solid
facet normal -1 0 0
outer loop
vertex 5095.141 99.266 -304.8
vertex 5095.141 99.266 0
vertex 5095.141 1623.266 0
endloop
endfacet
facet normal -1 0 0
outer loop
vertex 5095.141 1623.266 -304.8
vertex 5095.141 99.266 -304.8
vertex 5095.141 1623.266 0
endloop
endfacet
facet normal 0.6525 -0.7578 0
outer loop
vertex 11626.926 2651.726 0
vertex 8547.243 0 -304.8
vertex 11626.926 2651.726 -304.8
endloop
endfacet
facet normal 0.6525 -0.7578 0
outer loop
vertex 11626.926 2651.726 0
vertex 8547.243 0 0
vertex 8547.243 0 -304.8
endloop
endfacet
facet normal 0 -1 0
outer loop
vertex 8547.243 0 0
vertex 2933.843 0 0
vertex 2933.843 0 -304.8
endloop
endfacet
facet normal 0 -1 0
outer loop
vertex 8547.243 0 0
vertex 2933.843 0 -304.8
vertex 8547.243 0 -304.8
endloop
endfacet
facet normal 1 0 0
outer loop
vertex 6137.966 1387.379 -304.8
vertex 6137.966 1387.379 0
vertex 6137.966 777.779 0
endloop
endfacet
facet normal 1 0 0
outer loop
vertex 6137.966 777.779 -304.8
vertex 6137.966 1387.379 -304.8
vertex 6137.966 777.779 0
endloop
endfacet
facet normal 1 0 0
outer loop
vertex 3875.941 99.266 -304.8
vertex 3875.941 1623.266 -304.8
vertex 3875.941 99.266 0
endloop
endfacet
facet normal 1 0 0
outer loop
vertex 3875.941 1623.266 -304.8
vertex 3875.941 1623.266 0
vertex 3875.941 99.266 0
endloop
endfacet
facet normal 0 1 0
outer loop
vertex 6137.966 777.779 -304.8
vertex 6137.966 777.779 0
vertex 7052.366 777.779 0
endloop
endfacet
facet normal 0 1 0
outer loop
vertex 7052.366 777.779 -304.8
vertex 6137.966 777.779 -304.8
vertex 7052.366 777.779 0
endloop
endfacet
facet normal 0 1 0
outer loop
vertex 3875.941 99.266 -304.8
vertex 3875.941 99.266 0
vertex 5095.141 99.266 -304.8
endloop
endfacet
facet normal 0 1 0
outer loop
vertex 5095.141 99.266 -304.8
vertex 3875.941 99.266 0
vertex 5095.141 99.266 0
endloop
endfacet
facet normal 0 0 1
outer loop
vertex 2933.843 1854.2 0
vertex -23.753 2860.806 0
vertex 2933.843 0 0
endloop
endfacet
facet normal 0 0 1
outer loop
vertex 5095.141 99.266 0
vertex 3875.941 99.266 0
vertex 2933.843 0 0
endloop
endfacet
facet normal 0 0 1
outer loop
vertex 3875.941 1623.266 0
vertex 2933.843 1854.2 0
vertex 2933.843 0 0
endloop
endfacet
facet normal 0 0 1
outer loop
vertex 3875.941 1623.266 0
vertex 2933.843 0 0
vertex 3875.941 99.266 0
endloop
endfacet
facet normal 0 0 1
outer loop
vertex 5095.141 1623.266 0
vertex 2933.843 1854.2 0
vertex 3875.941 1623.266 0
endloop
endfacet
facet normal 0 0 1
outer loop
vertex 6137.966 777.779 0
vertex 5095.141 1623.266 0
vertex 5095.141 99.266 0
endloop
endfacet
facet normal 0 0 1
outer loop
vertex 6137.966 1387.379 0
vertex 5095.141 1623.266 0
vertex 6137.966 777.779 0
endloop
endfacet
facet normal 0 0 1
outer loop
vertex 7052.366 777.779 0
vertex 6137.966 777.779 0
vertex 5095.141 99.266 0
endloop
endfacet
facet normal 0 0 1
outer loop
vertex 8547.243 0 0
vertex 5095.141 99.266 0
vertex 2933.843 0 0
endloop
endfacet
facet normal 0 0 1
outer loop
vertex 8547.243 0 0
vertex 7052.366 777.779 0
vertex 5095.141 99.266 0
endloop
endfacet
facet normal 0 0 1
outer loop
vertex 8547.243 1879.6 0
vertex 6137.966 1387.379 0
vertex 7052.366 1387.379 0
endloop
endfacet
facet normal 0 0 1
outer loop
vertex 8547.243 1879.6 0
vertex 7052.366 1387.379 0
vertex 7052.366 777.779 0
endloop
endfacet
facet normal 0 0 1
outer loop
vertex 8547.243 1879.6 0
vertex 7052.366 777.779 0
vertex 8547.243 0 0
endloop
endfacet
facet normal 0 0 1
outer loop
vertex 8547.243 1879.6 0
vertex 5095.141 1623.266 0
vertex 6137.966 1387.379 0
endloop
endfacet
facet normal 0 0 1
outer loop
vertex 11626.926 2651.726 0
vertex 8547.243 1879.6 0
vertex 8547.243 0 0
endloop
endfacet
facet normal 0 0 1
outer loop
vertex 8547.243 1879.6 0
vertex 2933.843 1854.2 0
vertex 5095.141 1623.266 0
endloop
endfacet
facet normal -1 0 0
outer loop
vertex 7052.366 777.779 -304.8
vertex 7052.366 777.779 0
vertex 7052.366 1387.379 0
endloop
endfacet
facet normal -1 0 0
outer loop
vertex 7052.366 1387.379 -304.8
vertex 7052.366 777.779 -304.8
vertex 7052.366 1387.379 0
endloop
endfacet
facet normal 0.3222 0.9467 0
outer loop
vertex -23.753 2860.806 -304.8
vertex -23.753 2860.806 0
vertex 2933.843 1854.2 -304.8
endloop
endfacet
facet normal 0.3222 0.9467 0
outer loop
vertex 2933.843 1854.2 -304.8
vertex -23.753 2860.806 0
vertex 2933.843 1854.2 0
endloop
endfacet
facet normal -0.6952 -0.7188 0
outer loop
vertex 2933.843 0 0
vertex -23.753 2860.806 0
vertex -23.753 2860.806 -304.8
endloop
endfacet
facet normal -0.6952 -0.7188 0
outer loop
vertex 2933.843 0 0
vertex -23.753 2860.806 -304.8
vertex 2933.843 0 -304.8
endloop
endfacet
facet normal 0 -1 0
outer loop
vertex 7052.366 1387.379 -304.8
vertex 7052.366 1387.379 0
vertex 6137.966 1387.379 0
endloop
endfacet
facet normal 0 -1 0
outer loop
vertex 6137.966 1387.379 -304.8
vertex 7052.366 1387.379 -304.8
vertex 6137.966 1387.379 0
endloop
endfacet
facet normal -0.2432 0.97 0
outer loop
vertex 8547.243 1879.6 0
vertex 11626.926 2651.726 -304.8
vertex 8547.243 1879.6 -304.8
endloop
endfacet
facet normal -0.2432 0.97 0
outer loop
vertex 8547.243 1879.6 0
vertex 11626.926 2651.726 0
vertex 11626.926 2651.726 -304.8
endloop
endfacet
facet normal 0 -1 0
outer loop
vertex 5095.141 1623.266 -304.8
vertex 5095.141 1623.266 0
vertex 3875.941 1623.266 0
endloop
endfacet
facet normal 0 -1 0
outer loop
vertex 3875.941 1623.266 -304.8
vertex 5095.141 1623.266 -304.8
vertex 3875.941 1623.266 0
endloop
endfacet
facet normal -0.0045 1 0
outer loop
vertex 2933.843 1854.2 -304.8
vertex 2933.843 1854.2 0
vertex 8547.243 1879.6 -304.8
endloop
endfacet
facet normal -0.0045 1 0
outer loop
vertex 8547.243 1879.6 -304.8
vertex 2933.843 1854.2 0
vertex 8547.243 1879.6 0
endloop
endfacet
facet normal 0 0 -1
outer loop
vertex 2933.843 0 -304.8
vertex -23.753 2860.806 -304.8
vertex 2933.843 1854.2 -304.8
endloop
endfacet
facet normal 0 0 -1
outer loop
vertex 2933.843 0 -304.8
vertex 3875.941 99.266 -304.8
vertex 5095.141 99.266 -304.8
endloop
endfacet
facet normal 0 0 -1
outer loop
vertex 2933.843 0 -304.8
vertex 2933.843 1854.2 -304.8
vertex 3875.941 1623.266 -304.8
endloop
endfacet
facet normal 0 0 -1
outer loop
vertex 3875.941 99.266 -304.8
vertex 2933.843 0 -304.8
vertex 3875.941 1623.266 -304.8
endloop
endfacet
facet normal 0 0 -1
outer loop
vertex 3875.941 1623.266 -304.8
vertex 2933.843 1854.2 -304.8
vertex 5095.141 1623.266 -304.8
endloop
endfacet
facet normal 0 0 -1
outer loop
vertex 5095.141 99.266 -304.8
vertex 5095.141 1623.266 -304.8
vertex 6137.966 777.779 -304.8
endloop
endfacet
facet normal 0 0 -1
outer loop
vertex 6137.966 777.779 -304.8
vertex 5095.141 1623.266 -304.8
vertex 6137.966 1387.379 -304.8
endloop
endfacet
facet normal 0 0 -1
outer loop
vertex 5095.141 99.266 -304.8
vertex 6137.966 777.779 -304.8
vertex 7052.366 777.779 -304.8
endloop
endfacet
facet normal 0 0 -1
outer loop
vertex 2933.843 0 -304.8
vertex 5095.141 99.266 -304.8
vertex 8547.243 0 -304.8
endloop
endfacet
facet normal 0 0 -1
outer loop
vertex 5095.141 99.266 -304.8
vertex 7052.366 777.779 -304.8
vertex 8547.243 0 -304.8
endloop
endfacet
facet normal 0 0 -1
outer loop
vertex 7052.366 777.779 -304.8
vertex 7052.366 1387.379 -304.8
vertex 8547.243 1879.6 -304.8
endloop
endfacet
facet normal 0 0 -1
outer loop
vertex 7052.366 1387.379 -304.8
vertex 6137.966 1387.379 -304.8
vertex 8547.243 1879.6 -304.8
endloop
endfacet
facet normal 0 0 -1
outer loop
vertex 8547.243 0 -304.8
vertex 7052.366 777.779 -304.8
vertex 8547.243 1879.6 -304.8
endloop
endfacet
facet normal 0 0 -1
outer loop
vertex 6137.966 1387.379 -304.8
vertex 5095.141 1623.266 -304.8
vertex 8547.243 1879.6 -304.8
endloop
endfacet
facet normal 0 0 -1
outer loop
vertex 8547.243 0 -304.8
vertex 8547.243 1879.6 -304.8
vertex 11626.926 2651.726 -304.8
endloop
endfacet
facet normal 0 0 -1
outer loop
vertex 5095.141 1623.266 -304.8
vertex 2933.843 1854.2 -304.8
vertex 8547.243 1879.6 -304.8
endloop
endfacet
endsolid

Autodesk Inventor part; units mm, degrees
ref_plane "YZ Plane" through (0, 0, 0) normal (1, 0, 0) x (0, 1, 0)
ref_plane "XZ Plane" through (0, 0, 0) normal (0, 1, 0) x (-1, 0, 0)
ref_plane "XY Plane" through (0, 0, 0) normal (0, 0, 1) x (1, 0, 0)
sketch "Sketch1" plane through (0, 0, 0) normal (0, 0, 1) x (1, 0, 0)
  line L0 (-23.7527, 2860.8055) -> (2933.8428, 0)
  line L1 (2933.8428, 0) -> (2933.8428, 1854.2)
  line L2 (2933.8428, 0) -> (8547.2428, 0)
  line L3 (8547.2428, 0) -> (8547.2428, 1879.6)
  line L4 (2933.8428, 1854.2) -> (2933.8428, 0)
  line L5 (8547.2428, 0) -> (11626.9257, 2651.7257)
  line L6 (11626.9257, 2651.7257) -> (8547.2428, 1879.6)
  line L7 (3875.9406, 99.2664) -> (5095.1406, 99.2664)
  line L8 (5095.1406, 99.2664) -> (5095.1406, 1623.2664)
  line L9 (5095.1406, 1623.2664) -> (3875.9406, 1623.2664)
  line L10 (3875.9406, 1623.2664) -> (3875.9406, 99.2664)
  line L11 (3875.9406, 99.2664) -> (5095.1406, 1623.2664) construction
  line L12 (5095.1406, 99.2664) -> (3875.9406, 1623.2664) construction
  line L13 (-23.7527, 2860.8055) -> (2933.8428, 1854.2)
  line L14 (2933.8428, 1854.2) -> (8547.2428, 1879.6)
  line L15 (6137.9664, 777.779) -> (7052.3664, 777.779)
  line L16 (7052.3664, 777.779) -> (7052.3664, 1387.379)
  line L17 (7052.3664, 1387.379) -> (6137.9664, 1387.379)
  line L18 (6137.9664, 1387.379) -> (6137.9664, 777.779)
  line L19 (6137.9664, 777.779) -> (7052.3664, 1387.379) construction
  line L20 (7052.3664, 777.779) -> (6137.9664, 1387.379) construction
  point P0 (0, 0)
  point P1 (4485.5406, 861.2664)
  point P2 (6595.1664, 1082.579)
  dimension "d2" = 5613.4
  dimension "d5" = 1219.2
  dimension "d6" = 1524
  dimension "d8" = 4114.8
  dimension "d11" = 1854.2
  dimension "d12" = 3124.2
  dimension "d13" = 1879.6
  dimension "d14" = 4064
  dimension "d15" = 3175
  dimension "d16" = 914.4
  dimension "d17" = 609.6
extrude "Extrusion1" add sketch "Sketch1" against normal blind 304.8
properties part number "unwrappedDormerWestFacingDriveway"
